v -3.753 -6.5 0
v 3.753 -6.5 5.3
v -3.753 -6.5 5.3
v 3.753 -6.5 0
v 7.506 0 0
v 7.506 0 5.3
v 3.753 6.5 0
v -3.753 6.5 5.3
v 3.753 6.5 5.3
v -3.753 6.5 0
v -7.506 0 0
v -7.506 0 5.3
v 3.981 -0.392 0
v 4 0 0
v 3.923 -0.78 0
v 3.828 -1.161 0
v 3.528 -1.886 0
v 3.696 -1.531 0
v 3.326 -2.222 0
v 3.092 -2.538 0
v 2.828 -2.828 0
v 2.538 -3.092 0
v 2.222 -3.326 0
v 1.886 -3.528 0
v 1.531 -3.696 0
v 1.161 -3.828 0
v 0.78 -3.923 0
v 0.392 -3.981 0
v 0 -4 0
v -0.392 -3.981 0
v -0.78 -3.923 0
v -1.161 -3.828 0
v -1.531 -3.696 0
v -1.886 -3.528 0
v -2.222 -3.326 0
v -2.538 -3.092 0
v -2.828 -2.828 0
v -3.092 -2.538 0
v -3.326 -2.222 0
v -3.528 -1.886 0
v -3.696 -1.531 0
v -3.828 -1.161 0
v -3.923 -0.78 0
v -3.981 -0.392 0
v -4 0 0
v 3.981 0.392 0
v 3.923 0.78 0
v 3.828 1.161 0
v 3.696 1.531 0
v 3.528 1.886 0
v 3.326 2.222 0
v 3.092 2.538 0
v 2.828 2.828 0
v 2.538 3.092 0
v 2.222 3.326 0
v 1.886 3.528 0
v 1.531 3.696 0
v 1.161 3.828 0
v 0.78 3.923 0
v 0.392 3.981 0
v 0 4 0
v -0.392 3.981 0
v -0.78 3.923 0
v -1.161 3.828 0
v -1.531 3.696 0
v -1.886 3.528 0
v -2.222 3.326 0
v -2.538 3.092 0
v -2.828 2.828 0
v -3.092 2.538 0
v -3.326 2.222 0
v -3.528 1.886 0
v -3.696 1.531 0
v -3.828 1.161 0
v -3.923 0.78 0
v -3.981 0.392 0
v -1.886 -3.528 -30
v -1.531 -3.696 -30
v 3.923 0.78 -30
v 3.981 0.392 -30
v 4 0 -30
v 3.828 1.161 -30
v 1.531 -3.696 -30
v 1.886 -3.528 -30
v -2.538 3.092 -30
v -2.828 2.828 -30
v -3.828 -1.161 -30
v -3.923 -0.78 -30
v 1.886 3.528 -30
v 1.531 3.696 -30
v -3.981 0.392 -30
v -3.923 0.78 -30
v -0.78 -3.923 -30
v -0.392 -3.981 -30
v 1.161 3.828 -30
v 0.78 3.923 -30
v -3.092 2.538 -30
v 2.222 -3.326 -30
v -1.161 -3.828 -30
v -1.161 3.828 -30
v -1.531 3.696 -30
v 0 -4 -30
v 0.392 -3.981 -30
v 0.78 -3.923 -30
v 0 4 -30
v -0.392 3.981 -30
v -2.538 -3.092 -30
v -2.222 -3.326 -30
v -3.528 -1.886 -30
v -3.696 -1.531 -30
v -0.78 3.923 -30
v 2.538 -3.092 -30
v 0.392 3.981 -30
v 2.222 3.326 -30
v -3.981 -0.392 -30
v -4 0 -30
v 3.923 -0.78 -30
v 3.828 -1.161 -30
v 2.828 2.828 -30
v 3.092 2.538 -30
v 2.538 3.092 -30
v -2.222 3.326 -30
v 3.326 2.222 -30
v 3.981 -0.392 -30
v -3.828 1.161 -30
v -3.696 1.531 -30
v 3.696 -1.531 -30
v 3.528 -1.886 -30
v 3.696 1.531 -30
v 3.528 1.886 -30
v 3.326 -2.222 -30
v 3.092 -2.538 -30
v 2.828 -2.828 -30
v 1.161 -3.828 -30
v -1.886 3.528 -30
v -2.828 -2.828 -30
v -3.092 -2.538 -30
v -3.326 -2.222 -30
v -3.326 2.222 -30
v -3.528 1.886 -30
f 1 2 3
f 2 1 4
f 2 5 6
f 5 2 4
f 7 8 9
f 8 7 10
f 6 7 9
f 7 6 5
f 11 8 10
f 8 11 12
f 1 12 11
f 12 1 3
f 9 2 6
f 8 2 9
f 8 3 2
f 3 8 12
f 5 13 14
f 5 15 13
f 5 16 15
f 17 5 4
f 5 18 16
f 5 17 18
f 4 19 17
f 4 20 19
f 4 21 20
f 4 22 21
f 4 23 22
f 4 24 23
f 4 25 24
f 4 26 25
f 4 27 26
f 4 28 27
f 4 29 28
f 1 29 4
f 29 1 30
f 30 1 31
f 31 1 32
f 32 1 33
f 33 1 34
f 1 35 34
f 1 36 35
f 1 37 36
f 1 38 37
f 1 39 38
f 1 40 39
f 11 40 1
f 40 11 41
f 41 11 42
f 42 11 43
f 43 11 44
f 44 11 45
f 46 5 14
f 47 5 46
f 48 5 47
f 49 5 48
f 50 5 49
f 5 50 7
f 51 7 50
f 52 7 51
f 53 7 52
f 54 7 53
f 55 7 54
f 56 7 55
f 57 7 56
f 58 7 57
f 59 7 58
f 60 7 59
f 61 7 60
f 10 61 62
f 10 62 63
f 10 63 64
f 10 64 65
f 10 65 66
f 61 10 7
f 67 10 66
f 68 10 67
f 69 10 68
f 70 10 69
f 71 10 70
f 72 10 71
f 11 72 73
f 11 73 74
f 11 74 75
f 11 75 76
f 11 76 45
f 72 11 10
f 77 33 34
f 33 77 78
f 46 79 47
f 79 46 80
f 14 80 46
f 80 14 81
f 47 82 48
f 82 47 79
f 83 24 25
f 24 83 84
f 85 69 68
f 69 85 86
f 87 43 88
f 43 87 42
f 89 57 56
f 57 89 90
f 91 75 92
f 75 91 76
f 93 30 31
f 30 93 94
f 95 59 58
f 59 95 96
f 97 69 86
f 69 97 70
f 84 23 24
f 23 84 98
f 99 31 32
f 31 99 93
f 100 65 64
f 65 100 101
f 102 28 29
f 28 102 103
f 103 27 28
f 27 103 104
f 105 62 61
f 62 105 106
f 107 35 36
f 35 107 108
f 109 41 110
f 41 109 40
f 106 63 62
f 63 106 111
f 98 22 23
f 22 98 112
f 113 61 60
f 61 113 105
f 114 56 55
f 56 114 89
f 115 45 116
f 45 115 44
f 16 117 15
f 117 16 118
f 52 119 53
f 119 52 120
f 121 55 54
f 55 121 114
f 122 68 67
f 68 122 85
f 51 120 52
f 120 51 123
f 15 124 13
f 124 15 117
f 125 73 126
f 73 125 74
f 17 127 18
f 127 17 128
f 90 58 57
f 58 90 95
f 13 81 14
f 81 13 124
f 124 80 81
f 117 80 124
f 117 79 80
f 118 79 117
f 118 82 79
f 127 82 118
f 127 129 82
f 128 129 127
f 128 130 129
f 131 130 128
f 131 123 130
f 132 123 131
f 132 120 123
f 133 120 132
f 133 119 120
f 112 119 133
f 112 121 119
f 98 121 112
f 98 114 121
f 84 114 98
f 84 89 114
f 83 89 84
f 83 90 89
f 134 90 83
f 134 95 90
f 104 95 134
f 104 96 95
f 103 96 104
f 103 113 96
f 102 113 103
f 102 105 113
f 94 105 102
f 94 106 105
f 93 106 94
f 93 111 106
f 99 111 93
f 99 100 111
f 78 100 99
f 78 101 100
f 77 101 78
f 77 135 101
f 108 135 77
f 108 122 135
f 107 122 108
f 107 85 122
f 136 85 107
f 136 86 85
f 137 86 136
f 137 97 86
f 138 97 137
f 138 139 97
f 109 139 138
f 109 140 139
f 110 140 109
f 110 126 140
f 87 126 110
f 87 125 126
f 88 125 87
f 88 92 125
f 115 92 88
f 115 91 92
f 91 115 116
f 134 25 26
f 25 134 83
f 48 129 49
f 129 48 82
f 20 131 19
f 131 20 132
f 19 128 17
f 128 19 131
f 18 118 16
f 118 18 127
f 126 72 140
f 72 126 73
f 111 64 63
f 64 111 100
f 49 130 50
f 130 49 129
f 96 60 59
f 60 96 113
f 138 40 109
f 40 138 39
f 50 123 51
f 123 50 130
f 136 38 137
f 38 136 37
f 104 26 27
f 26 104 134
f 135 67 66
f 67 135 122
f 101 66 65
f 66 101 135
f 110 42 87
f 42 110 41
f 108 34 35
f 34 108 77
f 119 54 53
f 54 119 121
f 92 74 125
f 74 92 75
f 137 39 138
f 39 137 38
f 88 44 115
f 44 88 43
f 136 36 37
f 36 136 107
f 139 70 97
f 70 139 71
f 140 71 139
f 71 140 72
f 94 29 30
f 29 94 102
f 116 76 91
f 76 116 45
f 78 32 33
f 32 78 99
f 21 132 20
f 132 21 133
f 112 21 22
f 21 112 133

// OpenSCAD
// M8 Hex Bolt (simplified without threads)

// Parameters
head_across_flats = 13;    // Across-flats distance (mm)
head_height = 5.3;         // Head height (mm)
shank_diameter = 8;        // Shank diameter (mm)
shank_length = 30;         // Shank length (mm)

// Calculate circumscribed radius for hexagon
// For a regular hexagon, circumradius = across_flats / sqrt(3)
head_radius = head_across_flats / sqrt(3);

// Hex head (positioned with bottom at z=0, extending upward)
translate([0, 0, head_height/2])
    cylinder(h = head_height, r = head_radius, center = true, $fn = 6);

// Shank (positioned extending downward from z=0)
translate([0, 0, -shank_length/2])
    cylinder(h = shank_length, d = shank_diameter, center = true, $fn = 64);
